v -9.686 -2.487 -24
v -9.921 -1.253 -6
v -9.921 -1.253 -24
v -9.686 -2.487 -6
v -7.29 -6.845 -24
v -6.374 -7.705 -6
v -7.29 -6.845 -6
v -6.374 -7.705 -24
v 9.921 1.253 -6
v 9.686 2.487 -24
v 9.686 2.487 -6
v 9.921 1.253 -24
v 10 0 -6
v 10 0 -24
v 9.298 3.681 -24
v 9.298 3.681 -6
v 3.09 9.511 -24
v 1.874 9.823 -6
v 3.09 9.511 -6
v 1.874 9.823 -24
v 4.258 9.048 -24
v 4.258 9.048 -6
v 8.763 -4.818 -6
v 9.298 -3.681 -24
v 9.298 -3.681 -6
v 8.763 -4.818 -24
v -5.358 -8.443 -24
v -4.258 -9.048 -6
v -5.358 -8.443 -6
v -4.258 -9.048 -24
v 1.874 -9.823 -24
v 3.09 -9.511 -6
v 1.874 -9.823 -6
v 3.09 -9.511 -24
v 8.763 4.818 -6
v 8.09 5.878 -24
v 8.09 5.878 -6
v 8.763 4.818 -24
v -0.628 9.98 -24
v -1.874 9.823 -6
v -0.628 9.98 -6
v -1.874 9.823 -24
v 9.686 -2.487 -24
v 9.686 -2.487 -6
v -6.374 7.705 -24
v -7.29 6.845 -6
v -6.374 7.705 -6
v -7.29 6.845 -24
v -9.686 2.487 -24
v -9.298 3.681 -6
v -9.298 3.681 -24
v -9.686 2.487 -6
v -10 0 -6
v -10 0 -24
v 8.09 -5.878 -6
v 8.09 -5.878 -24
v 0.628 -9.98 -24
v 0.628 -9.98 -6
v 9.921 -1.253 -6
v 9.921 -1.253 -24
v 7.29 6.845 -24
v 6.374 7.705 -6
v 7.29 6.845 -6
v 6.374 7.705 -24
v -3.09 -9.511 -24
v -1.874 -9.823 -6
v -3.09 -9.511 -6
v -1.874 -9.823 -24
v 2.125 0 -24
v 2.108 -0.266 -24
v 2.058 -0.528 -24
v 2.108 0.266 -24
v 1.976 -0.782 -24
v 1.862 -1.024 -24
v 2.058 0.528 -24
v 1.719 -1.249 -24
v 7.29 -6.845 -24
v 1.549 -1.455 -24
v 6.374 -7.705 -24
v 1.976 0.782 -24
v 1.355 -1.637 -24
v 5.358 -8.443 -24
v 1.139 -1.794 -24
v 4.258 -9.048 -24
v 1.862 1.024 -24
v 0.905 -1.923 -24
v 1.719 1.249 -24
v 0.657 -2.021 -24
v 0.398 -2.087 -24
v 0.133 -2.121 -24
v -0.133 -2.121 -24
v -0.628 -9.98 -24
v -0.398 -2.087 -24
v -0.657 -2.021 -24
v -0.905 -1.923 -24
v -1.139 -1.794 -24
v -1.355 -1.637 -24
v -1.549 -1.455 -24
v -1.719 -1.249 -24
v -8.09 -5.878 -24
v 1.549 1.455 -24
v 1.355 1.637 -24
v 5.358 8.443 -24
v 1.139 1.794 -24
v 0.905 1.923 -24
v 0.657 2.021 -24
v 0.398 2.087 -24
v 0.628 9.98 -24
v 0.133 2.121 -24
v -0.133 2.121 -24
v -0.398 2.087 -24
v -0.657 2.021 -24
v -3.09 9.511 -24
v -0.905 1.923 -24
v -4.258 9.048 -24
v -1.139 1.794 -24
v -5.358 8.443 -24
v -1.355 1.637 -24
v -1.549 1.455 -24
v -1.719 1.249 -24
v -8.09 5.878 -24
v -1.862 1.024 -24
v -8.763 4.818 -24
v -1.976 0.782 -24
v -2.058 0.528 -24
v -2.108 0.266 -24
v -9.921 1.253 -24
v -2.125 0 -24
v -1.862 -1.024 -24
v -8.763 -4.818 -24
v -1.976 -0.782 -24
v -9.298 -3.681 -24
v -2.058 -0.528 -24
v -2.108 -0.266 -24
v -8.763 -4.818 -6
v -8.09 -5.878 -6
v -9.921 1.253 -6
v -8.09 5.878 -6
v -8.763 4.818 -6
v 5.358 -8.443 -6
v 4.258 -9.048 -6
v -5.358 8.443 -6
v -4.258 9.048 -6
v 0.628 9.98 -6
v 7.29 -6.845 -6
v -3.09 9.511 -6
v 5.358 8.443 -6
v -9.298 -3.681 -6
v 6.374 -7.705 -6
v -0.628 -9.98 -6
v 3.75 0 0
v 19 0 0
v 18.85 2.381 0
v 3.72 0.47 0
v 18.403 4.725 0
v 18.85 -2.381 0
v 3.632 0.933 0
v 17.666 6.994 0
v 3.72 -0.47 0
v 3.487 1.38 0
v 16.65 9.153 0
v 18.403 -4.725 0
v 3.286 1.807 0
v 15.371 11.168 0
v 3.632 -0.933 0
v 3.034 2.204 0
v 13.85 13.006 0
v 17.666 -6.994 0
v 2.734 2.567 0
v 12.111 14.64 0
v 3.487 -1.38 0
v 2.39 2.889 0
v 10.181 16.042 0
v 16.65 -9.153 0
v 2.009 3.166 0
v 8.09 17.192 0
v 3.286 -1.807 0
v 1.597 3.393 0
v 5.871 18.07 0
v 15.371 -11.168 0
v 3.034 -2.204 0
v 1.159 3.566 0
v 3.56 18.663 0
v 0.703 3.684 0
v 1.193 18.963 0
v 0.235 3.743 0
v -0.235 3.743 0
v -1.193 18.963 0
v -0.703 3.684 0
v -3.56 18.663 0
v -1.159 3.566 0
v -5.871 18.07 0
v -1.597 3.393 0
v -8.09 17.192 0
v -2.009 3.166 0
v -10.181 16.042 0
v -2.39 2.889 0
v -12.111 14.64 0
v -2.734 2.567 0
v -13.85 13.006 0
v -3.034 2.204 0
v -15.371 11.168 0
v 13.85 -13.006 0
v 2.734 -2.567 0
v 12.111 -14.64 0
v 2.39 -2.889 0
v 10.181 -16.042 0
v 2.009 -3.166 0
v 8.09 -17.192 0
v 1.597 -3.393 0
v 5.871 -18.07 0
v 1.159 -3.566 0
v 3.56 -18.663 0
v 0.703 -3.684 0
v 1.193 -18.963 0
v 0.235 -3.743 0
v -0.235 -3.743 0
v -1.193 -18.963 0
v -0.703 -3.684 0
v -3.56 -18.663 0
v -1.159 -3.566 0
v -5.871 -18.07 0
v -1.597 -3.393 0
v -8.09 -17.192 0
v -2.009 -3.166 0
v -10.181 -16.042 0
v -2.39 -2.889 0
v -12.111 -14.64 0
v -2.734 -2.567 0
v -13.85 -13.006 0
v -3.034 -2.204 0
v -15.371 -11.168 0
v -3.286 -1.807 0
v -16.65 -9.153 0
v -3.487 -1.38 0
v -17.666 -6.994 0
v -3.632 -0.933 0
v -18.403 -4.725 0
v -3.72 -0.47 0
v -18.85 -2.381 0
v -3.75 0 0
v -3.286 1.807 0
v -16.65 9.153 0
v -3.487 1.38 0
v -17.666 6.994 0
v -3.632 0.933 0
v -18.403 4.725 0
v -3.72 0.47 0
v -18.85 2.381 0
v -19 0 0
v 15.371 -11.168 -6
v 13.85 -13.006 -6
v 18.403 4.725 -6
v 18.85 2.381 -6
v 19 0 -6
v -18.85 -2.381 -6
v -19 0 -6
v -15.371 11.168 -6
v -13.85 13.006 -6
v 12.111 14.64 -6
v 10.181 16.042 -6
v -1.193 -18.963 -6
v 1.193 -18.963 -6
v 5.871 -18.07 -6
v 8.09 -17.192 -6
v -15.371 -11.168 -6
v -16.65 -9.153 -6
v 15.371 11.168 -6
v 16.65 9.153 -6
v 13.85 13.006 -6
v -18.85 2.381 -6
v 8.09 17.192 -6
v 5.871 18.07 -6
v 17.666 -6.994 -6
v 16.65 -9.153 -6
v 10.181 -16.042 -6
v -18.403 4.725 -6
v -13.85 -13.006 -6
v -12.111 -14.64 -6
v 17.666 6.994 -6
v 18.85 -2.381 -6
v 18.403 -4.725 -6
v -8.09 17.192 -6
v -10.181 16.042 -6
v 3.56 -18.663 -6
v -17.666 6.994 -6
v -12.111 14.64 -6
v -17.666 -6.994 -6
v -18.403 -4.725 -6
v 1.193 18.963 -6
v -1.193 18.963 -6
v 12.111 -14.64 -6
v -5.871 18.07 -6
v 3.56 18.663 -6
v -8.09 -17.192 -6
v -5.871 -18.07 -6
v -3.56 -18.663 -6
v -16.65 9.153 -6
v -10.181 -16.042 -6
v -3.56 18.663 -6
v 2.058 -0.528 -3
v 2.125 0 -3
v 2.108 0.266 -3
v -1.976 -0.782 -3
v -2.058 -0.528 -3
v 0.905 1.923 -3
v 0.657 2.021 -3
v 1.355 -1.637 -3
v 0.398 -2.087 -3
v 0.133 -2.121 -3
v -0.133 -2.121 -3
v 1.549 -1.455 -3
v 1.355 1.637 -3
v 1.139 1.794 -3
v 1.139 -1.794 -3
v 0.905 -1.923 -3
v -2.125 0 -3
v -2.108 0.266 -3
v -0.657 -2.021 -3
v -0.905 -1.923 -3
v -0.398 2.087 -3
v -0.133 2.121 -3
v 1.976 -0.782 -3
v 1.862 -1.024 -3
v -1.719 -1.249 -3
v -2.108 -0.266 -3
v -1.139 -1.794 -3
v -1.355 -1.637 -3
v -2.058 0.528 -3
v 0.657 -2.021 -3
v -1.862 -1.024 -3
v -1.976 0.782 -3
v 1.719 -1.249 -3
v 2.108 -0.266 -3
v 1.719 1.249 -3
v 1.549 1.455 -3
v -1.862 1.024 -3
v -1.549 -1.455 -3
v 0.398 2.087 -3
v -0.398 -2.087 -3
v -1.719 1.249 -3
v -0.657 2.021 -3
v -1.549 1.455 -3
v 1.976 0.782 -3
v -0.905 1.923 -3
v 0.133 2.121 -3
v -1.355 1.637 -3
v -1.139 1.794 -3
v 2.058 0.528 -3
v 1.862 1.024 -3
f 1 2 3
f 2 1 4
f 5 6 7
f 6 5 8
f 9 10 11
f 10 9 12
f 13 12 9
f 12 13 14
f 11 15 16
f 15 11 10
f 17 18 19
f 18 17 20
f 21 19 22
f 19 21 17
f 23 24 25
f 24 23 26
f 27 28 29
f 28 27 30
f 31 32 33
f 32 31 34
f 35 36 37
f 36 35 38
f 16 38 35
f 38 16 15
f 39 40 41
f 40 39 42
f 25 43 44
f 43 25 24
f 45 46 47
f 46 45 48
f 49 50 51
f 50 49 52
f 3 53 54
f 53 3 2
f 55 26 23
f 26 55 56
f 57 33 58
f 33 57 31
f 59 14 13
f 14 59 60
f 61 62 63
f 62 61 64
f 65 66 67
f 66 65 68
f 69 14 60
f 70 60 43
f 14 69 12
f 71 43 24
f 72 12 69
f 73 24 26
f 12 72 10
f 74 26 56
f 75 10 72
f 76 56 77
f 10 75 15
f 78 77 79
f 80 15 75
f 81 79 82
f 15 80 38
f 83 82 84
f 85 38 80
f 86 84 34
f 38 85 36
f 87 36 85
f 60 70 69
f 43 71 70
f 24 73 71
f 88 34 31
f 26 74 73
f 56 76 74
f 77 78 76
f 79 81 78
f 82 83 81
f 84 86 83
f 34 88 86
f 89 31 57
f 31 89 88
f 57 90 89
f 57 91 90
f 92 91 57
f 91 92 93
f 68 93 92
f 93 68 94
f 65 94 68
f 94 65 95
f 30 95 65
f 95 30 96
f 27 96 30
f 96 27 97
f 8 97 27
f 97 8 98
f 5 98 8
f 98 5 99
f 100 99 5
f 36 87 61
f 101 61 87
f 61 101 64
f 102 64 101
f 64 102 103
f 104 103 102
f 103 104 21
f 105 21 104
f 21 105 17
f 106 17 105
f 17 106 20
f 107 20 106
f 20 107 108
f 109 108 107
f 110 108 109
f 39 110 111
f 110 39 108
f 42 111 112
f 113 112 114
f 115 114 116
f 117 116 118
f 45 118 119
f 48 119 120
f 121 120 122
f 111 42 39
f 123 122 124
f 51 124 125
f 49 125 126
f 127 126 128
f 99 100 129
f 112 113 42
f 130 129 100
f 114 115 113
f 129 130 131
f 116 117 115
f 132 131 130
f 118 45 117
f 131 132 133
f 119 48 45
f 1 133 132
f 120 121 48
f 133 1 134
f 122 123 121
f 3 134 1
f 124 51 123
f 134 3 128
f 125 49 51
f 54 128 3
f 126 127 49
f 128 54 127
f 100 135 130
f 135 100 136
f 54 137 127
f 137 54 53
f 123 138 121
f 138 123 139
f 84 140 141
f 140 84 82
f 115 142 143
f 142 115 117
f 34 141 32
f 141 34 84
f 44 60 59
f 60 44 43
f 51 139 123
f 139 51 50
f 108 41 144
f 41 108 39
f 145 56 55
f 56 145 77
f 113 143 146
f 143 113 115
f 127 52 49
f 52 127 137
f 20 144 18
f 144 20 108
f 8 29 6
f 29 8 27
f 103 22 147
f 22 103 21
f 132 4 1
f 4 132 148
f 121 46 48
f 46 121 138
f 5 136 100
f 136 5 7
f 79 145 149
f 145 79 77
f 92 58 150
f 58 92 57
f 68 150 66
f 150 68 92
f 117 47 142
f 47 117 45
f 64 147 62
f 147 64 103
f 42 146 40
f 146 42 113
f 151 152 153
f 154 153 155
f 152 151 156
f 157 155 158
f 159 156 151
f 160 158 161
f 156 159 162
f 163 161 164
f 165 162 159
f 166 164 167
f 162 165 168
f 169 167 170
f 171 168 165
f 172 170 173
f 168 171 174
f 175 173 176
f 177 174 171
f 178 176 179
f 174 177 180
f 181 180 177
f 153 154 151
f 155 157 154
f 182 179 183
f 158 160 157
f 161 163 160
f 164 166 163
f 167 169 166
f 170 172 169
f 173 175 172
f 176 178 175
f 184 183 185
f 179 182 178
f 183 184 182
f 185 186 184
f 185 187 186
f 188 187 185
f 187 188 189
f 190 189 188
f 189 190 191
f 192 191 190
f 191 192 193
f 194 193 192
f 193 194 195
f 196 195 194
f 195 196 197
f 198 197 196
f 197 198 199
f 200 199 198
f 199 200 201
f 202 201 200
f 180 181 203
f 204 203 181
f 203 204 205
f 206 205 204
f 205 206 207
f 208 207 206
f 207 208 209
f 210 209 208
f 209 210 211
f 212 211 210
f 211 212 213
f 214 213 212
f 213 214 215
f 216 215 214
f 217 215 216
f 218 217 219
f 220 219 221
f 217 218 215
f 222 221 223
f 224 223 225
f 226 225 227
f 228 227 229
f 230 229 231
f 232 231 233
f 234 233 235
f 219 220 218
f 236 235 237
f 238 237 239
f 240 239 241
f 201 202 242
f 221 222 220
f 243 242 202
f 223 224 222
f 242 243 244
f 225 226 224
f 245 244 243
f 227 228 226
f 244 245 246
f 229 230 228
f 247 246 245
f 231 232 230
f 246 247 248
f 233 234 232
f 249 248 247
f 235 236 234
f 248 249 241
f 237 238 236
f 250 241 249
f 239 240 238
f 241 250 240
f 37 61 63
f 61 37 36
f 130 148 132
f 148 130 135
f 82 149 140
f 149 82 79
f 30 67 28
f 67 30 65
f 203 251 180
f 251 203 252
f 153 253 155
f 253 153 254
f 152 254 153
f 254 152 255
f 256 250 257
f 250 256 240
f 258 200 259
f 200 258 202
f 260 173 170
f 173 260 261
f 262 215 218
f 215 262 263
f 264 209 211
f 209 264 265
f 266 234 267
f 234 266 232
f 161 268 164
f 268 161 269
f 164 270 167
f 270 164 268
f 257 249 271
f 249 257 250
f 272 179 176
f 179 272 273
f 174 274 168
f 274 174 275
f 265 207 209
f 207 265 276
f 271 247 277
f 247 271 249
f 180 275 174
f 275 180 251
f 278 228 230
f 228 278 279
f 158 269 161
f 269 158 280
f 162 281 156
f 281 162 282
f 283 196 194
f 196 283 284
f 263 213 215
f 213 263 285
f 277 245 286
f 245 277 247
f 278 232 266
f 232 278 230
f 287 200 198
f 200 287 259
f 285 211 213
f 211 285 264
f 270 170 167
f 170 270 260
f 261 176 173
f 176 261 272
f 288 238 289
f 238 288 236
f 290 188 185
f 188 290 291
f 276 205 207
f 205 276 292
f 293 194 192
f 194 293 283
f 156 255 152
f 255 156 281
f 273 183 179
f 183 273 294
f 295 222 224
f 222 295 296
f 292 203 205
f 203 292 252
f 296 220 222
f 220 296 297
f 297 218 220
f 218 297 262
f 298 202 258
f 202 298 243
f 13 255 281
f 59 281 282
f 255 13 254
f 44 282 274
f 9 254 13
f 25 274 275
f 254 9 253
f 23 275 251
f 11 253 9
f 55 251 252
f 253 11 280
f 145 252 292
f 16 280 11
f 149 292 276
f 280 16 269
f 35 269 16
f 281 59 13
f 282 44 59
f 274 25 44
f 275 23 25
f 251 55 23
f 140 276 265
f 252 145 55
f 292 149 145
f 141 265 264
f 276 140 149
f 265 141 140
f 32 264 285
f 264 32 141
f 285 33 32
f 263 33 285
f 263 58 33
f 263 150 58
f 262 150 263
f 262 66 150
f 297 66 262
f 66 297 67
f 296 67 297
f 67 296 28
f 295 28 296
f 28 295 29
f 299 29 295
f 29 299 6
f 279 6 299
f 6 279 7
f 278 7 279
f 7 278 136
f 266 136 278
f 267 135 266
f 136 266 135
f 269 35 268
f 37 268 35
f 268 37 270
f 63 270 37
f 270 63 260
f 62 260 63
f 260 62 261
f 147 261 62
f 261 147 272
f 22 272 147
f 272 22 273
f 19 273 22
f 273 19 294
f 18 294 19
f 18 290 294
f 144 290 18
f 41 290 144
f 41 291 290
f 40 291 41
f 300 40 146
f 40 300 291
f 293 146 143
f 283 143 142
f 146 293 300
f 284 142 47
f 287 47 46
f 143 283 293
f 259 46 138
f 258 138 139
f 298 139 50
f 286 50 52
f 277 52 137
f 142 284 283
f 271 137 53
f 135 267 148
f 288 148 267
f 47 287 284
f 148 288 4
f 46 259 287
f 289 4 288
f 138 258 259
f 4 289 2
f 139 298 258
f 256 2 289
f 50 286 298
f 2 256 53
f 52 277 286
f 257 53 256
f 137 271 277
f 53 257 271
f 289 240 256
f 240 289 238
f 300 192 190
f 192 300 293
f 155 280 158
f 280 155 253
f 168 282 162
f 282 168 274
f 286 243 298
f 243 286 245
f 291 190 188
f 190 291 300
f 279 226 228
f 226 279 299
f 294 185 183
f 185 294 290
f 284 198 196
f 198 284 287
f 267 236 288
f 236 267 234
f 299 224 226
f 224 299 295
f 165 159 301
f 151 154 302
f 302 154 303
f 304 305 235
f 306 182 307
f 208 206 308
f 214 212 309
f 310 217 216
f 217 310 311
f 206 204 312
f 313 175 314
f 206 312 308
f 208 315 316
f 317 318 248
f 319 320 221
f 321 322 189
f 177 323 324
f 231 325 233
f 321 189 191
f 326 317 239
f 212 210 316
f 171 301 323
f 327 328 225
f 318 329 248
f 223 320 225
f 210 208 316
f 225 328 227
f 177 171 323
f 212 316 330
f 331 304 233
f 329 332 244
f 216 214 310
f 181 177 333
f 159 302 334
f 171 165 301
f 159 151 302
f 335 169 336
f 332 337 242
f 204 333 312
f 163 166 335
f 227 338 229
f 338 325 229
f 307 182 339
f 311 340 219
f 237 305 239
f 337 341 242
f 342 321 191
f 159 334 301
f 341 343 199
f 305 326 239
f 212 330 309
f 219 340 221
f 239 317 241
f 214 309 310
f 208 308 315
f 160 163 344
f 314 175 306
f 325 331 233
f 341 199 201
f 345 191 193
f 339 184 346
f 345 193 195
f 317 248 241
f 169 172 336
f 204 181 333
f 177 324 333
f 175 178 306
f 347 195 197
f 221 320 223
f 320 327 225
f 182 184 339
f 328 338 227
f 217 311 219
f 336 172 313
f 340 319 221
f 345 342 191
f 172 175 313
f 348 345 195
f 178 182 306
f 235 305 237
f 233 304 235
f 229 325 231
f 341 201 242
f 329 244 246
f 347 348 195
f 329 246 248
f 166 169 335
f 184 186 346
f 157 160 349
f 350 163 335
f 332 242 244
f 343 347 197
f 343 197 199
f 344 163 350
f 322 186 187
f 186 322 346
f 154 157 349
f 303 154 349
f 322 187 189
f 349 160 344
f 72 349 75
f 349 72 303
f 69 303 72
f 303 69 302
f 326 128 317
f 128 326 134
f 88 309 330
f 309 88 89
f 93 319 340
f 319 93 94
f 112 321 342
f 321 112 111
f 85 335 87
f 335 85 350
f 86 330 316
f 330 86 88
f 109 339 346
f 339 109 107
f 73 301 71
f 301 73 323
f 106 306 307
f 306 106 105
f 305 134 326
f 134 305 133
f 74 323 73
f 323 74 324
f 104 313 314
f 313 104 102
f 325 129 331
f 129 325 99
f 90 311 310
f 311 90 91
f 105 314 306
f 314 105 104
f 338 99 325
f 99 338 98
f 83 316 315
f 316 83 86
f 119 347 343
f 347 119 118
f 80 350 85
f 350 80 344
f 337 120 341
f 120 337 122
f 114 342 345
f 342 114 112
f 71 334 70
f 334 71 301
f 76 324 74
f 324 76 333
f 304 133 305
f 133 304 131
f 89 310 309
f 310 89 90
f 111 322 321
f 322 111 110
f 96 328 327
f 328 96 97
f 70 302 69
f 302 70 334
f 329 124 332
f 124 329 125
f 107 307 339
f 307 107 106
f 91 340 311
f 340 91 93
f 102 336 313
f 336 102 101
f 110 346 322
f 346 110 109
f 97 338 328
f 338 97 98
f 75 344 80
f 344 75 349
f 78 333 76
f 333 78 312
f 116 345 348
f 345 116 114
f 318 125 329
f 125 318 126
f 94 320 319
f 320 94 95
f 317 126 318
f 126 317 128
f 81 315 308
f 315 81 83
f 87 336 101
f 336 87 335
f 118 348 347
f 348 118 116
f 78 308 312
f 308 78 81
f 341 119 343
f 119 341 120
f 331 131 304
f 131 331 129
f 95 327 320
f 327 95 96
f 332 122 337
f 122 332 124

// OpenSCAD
$fn = 50;


difference() {
	union() {
		translate(v = [0, 0, -24.0000000000]) {
			cylinder(h = 24, r = 10.0000000000);
		}
		translate(v = [0, 0, -6.0000000000]) {
			cylinder(h = 6, r = 19.0000000000);
		}
	}
	union() {
		translate(v = [0, 0, 0]) {
			rotate(a = [0, 0, 0]) {
				difference() {
					union() {
						#translate(v = [0, 0, -24.0000000000]) {
							cylinder(h = 24, r = 2.0000000000);
						}
						#translate(v = [0, 0, -3]) {
							cylinder(h = 3, r = 10.0000000000, r1 = 2.1250000000, r2 = 3.7500000000);
						}
						#translate(v = [0, 0, -24.0000000000]) {
							cylinder(h = 24, r = 2.1250000000);
						}
						#translate(v = [0, 0, -24.0000000000]) {
							cylinder(h = 24, r = 2.0000000000);
						}
					}
					union();
				}
			}
		}
	}
}
